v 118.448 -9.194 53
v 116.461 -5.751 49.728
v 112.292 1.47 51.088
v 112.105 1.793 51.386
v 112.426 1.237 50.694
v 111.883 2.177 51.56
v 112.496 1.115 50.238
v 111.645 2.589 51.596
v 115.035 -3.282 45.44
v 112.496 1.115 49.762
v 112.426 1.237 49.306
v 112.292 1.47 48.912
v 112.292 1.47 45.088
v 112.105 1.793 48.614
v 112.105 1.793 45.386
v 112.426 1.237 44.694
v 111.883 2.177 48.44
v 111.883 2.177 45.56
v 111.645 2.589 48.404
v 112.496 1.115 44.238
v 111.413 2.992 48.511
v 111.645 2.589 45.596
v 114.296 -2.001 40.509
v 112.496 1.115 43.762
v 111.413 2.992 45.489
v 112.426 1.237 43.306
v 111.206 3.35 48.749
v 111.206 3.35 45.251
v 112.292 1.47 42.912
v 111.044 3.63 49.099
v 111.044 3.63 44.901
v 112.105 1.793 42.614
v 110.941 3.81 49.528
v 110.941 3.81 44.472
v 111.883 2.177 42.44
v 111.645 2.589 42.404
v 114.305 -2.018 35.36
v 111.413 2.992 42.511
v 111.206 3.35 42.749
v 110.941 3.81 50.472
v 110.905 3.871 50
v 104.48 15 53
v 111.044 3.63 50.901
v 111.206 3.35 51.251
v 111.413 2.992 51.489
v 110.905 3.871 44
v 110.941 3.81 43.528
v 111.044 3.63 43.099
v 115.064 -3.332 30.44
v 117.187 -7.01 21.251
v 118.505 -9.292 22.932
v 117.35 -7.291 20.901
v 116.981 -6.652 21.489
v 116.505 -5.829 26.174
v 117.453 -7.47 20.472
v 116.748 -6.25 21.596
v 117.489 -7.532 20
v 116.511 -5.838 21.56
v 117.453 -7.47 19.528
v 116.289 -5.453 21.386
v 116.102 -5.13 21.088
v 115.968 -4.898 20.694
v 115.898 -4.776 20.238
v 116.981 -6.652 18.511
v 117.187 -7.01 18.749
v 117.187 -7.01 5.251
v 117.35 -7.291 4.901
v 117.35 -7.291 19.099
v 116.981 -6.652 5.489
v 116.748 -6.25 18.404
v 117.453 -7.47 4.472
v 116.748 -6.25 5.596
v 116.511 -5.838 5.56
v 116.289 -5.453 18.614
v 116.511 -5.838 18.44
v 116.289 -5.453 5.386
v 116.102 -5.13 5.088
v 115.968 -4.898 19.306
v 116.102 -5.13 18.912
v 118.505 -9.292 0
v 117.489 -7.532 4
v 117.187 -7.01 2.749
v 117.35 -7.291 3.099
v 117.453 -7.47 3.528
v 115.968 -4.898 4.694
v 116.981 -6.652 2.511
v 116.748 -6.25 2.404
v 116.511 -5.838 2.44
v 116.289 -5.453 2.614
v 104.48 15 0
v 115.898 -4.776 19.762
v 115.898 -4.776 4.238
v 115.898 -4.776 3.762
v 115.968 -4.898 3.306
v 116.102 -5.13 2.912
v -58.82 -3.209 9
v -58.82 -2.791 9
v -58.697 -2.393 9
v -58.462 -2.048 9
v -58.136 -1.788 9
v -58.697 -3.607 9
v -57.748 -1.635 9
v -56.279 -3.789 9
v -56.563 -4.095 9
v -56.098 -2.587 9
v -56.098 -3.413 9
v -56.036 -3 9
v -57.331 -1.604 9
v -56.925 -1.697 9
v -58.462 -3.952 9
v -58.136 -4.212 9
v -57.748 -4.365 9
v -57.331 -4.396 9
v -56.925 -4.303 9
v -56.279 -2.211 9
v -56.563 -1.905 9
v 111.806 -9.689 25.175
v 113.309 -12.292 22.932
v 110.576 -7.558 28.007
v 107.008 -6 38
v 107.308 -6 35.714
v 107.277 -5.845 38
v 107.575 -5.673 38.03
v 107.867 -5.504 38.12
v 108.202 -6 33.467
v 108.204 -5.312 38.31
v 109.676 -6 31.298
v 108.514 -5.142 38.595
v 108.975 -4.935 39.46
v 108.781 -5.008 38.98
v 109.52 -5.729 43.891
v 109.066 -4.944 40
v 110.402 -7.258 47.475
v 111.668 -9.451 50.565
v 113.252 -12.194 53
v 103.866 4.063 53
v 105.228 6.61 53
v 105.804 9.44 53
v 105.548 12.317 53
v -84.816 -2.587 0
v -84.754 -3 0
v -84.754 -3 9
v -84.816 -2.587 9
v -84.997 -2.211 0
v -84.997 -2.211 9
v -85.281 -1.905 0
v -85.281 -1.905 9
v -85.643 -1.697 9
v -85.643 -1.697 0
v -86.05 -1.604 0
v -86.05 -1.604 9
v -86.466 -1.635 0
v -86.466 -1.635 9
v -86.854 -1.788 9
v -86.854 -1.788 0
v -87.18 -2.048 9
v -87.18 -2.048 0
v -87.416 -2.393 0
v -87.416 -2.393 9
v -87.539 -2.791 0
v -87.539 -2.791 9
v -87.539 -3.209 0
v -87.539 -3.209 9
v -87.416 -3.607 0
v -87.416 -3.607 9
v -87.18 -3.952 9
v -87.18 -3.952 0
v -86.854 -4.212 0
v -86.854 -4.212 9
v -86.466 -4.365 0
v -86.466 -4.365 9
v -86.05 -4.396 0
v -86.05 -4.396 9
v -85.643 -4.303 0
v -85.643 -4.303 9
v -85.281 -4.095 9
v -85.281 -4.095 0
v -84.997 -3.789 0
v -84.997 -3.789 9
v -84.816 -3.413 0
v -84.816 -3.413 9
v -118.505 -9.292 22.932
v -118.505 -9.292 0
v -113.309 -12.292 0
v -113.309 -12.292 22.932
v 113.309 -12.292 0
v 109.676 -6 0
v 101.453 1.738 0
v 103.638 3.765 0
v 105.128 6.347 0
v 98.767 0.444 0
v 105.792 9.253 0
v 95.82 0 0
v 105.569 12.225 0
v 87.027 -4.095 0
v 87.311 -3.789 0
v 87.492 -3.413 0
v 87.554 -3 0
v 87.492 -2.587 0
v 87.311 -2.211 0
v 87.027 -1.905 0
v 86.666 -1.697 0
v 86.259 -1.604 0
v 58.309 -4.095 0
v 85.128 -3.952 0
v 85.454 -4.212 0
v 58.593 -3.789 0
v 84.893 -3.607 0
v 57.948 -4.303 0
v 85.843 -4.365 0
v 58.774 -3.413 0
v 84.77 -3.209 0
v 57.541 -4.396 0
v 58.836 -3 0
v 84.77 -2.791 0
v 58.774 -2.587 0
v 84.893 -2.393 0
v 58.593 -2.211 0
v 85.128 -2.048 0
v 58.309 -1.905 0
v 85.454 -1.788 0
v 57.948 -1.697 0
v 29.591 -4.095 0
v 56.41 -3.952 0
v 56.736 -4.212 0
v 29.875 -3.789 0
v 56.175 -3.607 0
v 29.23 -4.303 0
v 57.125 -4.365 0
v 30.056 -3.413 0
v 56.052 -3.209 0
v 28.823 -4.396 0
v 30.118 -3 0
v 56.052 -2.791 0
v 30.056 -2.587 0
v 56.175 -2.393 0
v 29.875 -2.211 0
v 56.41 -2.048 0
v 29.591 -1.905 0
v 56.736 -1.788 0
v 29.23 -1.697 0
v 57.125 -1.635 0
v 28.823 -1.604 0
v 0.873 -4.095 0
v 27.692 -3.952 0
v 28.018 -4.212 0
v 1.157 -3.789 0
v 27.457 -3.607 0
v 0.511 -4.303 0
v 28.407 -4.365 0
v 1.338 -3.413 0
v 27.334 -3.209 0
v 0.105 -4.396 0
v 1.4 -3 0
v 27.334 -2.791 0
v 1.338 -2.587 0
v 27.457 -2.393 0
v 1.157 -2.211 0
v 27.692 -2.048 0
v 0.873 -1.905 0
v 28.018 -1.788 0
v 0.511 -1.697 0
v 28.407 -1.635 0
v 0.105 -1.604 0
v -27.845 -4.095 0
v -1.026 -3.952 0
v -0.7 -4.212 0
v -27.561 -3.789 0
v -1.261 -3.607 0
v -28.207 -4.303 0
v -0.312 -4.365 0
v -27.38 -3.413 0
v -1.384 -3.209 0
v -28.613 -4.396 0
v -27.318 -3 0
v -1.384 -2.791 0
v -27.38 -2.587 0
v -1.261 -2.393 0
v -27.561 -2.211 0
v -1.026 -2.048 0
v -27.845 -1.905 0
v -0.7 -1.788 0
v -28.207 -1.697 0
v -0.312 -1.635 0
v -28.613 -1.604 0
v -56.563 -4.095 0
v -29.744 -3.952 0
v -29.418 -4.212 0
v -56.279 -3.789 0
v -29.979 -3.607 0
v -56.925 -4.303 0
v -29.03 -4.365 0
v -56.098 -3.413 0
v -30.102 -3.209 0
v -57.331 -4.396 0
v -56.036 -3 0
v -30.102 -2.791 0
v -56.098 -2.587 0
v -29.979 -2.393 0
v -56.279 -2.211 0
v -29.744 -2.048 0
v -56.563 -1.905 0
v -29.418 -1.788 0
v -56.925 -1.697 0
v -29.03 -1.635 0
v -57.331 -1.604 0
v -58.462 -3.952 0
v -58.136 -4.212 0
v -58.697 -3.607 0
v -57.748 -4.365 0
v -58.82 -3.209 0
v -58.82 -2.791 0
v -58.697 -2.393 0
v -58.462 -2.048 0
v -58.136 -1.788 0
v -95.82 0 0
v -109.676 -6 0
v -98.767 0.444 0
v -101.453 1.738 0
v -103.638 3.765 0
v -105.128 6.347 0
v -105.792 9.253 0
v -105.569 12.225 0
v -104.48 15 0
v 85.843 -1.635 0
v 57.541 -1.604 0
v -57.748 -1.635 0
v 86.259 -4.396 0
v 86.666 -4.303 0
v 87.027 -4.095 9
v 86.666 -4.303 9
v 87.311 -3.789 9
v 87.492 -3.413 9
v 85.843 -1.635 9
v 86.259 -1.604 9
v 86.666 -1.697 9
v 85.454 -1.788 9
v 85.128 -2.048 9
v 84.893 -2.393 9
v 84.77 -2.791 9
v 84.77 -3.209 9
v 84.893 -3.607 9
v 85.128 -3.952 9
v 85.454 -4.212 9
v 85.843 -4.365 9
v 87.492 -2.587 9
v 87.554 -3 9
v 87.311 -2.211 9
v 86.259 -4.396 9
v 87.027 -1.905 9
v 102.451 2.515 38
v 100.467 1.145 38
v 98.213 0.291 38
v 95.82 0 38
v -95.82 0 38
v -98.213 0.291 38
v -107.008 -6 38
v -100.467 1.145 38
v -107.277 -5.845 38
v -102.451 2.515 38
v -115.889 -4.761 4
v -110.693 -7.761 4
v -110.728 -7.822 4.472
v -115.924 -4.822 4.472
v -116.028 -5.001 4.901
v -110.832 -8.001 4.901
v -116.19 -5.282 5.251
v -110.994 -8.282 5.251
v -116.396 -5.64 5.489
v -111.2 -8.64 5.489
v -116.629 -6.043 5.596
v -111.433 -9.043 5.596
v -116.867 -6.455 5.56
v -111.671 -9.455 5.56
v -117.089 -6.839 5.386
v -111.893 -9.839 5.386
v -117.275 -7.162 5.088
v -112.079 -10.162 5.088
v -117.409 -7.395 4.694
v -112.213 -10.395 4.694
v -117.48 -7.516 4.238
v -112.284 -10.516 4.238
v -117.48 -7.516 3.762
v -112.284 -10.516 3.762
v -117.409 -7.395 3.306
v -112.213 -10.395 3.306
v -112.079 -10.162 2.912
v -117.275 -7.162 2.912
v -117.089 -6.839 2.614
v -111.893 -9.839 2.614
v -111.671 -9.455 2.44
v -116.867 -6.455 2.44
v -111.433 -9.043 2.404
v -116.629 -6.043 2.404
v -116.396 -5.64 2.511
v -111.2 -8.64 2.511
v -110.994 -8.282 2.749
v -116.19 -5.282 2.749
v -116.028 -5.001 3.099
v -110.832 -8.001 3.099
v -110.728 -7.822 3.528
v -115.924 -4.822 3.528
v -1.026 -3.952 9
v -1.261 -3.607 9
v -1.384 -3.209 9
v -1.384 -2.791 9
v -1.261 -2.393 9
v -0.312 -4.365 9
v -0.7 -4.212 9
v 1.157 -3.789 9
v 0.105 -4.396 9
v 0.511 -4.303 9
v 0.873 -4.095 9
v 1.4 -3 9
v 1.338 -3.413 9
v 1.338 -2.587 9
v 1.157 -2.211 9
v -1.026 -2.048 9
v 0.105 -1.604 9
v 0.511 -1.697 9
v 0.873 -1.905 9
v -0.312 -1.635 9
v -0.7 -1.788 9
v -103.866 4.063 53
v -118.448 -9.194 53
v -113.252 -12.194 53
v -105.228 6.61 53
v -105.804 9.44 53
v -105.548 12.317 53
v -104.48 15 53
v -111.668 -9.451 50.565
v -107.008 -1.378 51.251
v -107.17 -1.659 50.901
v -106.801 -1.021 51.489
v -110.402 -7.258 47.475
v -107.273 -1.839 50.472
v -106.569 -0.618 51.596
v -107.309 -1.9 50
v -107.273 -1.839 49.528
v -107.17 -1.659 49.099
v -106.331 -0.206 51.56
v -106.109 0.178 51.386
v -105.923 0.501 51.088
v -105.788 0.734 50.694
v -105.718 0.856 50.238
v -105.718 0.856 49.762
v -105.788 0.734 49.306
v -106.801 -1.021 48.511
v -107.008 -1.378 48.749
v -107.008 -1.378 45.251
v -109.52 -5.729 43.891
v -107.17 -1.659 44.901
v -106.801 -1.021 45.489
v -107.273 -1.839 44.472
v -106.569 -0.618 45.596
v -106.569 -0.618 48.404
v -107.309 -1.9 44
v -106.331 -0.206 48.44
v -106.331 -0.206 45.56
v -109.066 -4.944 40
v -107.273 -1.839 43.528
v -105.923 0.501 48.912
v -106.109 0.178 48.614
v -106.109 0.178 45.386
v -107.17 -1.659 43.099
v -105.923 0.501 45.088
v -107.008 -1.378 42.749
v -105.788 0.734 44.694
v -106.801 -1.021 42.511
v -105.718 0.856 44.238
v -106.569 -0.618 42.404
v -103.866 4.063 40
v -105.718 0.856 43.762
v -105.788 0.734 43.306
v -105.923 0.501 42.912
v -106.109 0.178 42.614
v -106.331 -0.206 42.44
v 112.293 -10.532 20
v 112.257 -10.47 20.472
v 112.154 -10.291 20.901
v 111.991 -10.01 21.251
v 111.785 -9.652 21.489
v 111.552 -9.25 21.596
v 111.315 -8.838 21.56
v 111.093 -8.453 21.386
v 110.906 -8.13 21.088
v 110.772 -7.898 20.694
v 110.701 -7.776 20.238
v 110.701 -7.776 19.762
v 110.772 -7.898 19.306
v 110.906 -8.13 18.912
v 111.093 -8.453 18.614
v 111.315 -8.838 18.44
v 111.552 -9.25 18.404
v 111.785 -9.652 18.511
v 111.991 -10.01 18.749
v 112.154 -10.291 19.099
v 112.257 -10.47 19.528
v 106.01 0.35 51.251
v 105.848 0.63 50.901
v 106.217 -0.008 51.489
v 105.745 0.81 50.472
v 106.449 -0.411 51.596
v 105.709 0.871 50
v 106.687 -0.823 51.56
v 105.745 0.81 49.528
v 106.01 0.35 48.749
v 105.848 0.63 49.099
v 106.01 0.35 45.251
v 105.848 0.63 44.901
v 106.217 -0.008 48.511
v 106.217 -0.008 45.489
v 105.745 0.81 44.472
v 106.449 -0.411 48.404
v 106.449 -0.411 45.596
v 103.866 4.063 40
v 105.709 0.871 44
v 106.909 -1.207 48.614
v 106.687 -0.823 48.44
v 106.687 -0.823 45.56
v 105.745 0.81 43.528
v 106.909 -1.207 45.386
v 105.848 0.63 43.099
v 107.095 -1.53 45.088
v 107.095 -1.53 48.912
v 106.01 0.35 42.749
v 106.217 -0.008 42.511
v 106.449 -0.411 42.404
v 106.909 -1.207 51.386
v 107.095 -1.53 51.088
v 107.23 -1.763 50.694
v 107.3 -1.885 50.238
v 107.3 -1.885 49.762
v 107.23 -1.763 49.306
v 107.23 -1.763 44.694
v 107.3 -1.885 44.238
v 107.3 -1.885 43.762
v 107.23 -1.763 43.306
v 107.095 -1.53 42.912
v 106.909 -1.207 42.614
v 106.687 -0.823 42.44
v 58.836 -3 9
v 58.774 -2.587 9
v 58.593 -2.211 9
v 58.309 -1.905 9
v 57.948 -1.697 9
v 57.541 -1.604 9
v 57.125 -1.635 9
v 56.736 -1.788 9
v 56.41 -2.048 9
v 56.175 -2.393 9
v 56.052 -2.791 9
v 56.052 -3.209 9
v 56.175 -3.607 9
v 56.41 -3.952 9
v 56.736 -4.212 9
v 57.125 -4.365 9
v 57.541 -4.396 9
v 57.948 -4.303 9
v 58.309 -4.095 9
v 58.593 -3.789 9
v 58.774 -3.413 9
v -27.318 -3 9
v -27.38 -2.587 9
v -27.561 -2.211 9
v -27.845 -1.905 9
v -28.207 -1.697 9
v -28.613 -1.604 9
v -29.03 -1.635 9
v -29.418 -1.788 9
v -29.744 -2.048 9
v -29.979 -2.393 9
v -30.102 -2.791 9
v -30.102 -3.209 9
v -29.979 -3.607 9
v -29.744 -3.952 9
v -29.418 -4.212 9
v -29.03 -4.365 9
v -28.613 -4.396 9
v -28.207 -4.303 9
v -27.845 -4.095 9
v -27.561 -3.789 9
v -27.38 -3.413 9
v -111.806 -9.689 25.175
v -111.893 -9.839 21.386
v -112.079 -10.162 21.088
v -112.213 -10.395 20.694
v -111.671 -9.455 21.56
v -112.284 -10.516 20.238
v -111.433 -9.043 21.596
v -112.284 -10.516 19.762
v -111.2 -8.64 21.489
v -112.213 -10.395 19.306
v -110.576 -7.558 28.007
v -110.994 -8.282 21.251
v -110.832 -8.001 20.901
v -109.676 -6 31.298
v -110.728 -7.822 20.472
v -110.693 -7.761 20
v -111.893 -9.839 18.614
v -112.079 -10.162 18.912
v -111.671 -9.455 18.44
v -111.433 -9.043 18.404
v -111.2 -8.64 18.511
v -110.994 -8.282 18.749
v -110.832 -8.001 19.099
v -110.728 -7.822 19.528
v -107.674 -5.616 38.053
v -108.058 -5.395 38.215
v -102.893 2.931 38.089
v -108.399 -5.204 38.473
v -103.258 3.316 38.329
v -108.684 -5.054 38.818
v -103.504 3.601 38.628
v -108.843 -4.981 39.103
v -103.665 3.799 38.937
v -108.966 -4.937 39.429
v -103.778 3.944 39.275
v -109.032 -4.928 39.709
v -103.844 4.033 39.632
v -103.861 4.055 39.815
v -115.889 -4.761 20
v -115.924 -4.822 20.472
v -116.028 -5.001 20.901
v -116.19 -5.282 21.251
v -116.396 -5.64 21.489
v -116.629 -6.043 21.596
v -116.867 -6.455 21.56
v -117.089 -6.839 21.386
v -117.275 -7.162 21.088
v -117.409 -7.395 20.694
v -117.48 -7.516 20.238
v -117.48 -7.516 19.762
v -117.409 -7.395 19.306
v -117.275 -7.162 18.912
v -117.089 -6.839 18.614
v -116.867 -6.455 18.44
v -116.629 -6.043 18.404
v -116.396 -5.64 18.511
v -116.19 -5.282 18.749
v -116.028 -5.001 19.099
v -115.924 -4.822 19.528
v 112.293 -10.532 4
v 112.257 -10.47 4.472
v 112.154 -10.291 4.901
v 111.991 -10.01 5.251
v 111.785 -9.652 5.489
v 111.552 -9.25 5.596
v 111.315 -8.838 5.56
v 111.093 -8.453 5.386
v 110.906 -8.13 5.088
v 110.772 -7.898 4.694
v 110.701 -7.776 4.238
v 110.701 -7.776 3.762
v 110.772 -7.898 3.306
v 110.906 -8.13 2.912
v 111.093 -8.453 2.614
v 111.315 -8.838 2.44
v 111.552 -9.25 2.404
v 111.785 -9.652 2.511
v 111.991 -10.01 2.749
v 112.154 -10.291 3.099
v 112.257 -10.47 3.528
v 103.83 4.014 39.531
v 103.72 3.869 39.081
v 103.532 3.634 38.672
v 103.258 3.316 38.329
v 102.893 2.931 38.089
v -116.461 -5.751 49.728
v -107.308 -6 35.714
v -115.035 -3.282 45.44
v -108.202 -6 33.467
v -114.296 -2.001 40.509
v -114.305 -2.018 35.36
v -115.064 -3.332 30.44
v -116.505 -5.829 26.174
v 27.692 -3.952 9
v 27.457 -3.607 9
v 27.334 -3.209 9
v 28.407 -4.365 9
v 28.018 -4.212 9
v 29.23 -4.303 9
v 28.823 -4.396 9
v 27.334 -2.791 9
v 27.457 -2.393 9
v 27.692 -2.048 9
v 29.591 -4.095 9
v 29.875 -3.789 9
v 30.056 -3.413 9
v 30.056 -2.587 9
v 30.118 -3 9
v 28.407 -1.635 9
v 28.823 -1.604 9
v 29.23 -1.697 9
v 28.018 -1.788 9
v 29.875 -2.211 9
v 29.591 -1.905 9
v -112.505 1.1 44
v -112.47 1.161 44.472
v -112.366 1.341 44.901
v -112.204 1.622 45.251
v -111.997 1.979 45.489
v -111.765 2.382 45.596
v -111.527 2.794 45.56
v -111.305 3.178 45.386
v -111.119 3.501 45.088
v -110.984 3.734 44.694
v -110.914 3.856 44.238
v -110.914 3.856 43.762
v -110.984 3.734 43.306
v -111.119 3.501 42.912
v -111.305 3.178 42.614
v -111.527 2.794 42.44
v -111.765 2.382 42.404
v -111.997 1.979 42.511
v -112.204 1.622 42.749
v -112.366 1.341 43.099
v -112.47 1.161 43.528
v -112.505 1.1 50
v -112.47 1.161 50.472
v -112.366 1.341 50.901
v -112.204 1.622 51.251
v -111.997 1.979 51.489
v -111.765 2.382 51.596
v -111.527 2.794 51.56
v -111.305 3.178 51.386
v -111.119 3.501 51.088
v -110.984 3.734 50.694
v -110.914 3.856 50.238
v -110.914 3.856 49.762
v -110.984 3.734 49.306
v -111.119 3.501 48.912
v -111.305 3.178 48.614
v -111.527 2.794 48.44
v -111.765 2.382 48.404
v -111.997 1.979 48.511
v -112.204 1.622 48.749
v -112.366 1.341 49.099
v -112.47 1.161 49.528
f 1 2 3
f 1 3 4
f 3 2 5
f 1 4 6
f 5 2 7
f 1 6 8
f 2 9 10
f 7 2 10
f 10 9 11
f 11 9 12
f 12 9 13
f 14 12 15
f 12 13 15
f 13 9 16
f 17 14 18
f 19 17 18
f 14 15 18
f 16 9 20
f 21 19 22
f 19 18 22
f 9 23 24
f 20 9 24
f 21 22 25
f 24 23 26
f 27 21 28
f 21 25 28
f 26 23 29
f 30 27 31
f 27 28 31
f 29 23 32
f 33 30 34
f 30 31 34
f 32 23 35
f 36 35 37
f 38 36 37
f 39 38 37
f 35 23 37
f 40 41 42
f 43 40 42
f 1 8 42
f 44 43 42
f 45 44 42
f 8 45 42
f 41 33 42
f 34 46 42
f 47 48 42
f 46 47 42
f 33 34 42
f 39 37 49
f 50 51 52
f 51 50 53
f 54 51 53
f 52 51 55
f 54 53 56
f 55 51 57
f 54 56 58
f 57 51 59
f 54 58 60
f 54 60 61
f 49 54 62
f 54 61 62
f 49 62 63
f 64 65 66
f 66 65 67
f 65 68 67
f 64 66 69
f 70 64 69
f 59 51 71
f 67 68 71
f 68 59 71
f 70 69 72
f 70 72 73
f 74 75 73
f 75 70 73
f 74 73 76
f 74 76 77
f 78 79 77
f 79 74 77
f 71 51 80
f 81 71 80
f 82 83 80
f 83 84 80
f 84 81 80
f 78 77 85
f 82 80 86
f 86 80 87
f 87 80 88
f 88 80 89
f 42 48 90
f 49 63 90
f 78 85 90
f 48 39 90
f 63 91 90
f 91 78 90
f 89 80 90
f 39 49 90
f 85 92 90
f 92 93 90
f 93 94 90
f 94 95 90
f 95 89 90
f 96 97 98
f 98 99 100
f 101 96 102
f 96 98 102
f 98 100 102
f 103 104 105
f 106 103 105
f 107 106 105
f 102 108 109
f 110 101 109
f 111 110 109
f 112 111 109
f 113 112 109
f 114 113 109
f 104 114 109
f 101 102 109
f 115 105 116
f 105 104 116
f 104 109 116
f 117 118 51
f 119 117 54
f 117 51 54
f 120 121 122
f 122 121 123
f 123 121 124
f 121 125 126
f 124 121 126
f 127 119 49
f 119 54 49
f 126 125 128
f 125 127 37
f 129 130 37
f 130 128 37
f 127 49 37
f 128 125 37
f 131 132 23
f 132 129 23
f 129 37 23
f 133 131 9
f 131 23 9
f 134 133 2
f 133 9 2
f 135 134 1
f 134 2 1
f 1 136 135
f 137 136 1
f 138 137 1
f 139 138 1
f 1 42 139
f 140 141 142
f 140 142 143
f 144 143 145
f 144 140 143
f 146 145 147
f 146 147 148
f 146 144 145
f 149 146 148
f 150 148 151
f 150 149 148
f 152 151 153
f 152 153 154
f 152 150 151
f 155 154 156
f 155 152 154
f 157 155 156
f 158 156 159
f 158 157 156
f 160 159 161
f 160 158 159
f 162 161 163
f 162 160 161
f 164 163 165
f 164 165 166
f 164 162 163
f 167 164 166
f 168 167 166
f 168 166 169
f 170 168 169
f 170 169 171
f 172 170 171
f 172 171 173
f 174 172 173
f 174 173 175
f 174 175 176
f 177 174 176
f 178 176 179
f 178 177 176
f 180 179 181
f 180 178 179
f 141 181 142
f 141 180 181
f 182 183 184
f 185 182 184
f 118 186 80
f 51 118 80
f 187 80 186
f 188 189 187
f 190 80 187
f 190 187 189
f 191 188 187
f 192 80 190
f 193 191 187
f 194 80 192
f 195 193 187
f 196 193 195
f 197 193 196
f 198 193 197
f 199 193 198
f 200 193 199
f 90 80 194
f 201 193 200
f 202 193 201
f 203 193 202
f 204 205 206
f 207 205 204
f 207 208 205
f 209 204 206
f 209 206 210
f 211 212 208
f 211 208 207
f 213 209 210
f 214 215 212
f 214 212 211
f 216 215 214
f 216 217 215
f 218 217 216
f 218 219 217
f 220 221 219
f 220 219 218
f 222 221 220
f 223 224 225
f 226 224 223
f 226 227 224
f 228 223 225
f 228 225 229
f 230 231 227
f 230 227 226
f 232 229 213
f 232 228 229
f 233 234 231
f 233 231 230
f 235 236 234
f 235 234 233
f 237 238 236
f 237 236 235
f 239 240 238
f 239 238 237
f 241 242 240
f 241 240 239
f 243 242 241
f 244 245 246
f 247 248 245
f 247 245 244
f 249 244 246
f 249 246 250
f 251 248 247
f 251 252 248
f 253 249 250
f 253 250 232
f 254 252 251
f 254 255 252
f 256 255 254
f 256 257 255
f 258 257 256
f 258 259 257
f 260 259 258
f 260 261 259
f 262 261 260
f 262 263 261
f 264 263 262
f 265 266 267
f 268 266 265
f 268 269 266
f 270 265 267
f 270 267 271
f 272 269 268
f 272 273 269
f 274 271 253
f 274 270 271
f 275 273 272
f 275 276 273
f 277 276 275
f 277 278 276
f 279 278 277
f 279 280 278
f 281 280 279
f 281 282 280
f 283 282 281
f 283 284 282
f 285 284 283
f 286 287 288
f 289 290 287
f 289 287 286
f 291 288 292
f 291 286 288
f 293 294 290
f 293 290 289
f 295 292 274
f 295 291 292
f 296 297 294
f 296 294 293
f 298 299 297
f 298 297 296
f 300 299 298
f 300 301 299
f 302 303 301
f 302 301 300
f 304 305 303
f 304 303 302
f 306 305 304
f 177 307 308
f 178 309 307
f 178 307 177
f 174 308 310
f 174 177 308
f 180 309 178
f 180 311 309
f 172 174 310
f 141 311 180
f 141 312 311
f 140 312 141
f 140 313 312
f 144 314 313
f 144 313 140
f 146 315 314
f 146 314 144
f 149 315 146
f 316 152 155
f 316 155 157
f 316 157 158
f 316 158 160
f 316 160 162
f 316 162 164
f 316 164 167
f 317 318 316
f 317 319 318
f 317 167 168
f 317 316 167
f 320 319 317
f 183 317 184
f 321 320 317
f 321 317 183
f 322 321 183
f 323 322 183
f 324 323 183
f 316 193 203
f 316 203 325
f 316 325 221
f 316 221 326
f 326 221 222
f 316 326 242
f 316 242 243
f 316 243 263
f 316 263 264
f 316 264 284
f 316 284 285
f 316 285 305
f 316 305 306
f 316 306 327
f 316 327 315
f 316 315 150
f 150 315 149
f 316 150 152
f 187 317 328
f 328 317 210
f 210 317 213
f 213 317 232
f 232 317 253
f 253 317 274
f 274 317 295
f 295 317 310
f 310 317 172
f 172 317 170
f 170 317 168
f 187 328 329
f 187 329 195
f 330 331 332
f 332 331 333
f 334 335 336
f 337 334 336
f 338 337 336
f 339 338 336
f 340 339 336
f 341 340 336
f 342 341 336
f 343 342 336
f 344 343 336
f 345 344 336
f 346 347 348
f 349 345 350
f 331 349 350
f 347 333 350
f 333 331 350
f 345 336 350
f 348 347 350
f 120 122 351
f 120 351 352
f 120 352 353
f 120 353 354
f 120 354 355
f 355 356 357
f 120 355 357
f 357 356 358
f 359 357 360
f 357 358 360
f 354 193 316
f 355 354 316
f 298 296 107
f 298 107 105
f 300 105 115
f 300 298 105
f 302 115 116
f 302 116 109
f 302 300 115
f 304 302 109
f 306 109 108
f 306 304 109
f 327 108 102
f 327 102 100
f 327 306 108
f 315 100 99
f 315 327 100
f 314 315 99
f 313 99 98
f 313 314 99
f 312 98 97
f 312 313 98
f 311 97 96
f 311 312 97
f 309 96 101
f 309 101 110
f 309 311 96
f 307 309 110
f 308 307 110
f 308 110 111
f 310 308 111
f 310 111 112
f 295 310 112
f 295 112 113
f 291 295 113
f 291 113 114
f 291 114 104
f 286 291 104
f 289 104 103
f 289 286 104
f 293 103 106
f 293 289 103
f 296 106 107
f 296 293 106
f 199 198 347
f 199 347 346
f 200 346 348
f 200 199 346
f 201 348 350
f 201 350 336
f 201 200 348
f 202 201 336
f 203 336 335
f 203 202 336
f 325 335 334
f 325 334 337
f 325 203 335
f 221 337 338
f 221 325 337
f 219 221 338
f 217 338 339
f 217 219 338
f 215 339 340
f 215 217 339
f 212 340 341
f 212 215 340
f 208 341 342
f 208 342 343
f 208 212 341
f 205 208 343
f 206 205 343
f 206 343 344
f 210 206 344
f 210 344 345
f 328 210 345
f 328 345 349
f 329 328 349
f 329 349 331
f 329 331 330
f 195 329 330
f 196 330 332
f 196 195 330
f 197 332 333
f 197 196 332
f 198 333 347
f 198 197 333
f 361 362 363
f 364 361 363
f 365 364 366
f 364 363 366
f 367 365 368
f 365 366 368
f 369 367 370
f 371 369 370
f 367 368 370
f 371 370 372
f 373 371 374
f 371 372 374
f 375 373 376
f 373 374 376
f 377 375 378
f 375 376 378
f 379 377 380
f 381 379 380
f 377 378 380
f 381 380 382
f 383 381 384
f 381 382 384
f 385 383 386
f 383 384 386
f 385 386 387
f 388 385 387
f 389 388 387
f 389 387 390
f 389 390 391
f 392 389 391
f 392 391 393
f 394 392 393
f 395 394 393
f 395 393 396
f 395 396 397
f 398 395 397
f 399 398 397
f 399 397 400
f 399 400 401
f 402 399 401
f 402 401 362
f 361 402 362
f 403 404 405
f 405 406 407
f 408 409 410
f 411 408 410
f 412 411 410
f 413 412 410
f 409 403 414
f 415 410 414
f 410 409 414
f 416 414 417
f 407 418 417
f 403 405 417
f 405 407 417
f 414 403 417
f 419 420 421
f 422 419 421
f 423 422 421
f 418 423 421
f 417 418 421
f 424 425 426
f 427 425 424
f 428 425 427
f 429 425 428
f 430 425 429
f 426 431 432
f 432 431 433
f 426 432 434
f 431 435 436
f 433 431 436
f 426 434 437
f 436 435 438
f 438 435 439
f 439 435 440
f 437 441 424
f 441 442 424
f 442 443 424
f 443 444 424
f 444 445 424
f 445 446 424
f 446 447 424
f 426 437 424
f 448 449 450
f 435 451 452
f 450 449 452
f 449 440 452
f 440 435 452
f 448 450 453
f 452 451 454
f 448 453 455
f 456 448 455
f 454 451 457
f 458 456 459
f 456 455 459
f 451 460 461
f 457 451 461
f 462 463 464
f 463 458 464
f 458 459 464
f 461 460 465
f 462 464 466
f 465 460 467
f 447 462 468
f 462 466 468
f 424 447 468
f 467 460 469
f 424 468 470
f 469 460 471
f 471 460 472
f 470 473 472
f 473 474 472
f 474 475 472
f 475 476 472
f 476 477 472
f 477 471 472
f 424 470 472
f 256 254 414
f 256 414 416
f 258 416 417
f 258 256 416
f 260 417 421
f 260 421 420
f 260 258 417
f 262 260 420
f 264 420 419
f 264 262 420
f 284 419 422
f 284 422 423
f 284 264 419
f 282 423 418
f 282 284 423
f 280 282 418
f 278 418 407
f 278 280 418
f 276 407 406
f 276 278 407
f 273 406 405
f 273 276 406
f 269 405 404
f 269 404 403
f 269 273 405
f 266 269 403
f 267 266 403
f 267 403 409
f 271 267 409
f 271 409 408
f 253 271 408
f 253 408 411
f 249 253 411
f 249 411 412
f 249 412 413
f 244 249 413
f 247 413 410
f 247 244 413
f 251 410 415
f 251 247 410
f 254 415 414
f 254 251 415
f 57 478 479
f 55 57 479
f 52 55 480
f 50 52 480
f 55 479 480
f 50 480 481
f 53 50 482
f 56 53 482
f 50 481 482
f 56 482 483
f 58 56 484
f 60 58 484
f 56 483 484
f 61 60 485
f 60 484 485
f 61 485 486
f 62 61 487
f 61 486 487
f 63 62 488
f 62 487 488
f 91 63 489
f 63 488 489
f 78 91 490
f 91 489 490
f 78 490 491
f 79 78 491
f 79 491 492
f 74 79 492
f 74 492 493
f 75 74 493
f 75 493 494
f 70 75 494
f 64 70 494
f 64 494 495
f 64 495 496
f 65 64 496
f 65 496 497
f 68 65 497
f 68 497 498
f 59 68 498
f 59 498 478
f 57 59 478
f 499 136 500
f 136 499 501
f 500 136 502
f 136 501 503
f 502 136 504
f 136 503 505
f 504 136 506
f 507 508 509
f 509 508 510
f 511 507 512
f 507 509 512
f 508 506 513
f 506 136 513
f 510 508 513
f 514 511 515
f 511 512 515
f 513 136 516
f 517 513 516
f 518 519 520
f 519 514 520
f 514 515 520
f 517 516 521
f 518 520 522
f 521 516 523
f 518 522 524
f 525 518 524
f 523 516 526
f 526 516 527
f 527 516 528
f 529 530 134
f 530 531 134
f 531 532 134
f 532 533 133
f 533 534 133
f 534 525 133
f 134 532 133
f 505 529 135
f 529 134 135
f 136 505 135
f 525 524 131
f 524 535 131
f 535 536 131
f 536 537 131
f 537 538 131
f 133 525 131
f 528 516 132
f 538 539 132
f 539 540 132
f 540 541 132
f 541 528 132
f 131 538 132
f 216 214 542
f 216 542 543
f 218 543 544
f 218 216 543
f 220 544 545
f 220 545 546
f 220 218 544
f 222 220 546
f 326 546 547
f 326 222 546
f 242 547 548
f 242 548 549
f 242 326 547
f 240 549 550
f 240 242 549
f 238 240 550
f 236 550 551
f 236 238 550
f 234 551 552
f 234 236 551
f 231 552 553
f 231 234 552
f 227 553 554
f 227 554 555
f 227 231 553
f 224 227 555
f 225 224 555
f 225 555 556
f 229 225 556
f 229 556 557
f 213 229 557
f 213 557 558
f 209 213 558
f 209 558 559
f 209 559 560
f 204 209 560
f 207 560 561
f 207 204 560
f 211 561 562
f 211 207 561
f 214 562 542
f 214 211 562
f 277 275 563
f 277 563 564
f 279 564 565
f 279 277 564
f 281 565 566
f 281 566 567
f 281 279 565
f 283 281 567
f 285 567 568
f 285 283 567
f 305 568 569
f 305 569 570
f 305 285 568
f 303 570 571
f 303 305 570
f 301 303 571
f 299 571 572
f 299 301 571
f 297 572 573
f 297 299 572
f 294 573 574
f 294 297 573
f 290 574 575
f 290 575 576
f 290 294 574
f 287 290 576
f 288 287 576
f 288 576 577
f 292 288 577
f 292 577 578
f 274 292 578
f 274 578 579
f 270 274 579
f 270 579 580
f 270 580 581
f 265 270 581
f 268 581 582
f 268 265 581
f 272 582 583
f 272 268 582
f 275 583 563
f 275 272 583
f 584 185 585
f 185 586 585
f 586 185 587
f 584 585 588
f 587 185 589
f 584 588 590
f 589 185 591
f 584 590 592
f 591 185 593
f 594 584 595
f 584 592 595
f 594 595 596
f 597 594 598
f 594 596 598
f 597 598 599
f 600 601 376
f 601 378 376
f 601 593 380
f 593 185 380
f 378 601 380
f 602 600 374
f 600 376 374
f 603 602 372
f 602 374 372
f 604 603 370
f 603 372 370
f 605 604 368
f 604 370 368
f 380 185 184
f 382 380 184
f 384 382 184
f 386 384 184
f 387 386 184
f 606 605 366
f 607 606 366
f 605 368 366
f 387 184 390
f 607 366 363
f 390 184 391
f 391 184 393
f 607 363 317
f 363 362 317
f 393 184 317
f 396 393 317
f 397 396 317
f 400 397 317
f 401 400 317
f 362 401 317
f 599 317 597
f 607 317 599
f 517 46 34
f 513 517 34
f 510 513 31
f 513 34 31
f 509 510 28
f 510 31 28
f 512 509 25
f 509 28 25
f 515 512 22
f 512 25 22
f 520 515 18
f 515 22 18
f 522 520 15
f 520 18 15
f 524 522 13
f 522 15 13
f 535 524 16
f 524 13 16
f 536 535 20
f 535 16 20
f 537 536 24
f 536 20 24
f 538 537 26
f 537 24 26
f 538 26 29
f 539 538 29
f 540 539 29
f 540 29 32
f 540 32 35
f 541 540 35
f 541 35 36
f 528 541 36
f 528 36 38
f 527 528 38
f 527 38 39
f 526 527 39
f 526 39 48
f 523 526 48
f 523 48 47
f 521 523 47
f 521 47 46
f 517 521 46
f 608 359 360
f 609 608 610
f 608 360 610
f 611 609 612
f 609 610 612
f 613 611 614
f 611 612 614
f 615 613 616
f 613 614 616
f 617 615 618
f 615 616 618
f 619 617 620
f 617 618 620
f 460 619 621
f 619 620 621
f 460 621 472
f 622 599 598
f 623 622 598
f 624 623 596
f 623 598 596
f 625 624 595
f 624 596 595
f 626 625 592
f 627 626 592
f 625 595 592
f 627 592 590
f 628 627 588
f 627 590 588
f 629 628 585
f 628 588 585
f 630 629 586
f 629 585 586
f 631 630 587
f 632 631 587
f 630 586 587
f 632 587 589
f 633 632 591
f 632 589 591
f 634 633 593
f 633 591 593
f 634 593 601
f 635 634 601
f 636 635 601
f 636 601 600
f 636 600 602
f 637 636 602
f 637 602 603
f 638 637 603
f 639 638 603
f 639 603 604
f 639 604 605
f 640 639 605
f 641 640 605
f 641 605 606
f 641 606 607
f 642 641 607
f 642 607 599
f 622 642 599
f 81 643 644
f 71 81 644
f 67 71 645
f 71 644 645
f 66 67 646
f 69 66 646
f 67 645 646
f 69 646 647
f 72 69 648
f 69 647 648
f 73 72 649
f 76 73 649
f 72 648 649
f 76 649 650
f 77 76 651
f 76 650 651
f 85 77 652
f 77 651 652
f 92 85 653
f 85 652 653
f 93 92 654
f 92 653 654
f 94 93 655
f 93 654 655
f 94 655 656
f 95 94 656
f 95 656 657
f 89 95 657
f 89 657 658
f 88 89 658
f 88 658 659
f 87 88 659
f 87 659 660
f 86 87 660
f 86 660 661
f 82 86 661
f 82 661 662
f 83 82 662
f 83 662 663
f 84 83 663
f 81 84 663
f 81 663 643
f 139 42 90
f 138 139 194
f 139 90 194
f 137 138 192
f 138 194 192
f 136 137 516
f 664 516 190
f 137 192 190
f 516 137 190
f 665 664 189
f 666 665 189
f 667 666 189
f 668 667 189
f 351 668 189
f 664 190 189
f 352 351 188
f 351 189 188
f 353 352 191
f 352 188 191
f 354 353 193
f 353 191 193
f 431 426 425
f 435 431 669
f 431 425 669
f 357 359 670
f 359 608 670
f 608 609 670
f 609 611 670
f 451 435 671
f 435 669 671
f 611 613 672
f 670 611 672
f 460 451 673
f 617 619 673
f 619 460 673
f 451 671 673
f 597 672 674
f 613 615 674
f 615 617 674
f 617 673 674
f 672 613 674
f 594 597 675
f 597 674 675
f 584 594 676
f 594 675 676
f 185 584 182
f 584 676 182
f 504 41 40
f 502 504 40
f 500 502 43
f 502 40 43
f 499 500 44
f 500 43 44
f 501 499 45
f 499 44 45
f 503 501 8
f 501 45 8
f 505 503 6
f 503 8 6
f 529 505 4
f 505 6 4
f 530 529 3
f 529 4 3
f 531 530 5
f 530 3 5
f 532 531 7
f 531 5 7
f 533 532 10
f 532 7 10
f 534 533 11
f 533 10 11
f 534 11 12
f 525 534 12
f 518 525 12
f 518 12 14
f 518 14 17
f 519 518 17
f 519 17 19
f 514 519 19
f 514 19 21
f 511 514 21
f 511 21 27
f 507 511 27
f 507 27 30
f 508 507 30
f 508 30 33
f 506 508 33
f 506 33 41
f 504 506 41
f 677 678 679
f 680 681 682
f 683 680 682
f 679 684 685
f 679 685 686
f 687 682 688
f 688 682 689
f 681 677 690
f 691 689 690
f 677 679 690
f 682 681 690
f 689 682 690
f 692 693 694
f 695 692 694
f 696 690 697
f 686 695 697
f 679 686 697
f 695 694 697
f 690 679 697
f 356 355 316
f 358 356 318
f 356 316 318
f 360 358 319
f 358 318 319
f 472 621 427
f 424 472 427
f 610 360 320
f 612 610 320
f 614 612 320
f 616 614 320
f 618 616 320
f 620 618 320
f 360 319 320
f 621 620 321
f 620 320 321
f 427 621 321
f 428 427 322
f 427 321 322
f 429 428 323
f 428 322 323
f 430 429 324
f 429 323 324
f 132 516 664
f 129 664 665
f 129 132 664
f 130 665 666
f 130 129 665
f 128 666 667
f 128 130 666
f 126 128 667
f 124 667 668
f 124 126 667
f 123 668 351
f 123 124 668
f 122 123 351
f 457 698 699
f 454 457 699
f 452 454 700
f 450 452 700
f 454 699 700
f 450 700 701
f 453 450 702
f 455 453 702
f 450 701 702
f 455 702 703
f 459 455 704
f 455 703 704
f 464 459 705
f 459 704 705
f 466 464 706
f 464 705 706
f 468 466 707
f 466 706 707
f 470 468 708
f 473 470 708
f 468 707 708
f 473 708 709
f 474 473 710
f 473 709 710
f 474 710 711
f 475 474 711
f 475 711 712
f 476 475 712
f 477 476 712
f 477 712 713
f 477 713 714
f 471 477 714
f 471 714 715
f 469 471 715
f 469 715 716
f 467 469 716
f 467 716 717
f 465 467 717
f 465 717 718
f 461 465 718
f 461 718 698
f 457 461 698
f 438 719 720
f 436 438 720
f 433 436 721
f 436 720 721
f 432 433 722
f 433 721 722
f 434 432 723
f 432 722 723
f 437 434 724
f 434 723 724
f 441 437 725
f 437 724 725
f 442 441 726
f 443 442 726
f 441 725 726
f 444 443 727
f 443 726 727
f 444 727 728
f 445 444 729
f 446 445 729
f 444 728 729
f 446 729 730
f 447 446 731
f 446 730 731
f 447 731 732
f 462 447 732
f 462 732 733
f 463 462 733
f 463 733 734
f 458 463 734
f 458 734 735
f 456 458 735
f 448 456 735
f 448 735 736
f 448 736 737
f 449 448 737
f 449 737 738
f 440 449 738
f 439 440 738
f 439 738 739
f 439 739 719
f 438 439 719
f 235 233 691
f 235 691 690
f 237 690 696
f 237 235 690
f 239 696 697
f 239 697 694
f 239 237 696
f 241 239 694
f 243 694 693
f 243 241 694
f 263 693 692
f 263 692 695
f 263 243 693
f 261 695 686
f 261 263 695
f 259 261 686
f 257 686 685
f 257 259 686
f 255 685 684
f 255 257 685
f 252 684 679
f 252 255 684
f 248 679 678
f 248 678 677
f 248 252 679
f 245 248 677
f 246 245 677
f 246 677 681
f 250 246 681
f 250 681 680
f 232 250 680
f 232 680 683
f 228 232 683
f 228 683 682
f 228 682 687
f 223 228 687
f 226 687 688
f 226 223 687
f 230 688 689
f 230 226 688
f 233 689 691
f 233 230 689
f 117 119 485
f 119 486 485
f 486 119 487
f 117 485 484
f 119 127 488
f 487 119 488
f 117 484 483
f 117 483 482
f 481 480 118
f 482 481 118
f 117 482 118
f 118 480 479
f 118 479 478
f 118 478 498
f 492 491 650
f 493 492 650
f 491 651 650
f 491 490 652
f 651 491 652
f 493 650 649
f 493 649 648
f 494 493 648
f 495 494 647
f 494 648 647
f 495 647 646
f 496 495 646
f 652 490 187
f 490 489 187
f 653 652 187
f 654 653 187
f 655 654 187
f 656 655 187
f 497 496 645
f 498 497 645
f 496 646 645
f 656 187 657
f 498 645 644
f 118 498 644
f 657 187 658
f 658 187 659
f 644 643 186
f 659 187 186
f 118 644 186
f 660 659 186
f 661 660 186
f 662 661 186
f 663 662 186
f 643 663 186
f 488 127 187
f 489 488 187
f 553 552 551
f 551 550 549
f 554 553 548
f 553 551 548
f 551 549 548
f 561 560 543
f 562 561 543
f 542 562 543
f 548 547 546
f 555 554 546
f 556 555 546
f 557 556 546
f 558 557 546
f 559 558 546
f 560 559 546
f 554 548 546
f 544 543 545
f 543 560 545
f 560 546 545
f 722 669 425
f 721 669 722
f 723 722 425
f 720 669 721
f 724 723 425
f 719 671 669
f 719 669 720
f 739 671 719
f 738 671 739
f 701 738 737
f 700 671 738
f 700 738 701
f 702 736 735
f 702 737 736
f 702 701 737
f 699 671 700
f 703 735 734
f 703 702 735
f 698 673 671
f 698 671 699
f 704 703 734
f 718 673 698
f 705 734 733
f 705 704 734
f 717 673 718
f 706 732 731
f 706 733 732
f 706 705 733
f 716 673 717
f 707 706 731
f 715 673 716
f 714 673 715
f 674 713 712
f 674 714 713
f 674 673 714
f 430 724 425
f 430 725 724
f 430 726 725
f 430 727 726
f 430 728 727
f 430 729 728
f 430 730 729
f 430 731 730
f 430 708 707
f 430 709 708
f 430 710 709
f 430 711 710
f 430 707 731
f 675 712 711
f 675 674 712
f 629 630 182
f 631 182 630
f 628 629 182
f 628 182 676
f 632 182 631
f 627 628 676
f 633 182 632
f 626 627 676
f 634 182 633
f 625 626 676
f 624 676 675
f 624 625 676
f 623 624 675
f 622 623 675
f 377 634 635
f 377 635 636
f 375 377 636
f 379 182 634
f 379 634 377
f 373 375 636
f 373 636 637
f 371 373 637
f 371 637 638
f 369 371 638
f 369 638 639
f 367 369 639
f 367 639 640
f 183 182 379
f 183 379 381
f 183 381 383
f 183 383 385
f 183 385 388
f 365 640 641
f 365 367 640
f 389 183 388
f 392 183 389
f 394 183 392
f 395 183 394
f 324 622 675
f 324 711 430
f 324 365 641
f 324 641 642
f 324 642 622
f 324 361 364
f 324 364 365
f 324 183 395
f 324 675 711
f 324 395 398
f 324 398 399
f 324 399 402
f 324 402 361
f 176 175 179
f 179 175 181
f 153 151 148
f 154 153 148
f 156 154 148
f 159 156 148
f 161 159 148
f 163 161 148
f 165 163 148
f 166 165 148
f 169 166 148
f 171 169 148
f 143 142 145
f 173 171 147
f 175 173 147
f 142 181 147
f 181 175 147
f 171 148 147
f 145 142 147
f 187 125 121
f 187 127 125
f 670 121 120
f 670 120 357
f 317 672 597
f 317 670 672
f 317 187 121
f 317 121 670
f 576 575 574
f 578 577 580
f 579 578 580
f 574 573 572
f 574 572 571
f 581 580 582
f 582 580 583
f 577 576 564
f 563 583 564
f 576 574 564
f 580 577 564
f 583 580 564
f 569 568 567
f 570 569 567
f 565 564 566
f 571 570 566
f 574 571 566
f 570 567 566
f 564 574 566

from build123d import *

# Parameters (mm, degrees)
BOSS_EXTRUDE1_DEPTH = 2
BOSS_EXTRUDE2_DEPTH = 38
MANUAL_FILLET_DEPTH = 38
SKETCH7_R           = 1.399999999999996
SKETCH7_R_2         = 1.4
SKETCH7_R_3         = 1.3999999999999992
SKETCH7_R_4         = 1.4000000000000026
BOTTOM_SCREWS_DEPTH = 9
LEFT_SCREWS_REACH   = 212.024
SKETCH8_R           = 1.6000000000000127
SKETCH8_R_2         = 1.600000000000008
RIGHT_SCREWS_REACH  = 212.024
SKETCH9_R           = 1.6000000000000127
SKETCH9_R_2         = 1.600000000000007
BOSS_EXTRUDE3_DEPTH = 15
CUT_EXTRUDE1_REACH  = 220.907
SKETCH10_R          = 17.50000000000029
SKETCH10_R_2        = 1.6000000000000194
SKETCH10_R_3        = 1.5999999999999908
CUT_EXTRUDE2_REACH  = 220.907
SKETCH11_R          = 17.500000000000004
SKETCH11_R_2        = 1.600000000000006
SKETCH11_R_3        = 1.5999999999999974
FILLET1_R           = 2


with BuildPart() as part:
    # Sketch2 → Boss-Extrude1 (new body)
    with BuildSketch(Plane.XY):
        Polygon((-113.14018169510446, 0), (113.14018169510446, 2.771e-14), (118.50513169510454, -9.292365980066561), (113.30897927239795, -12.292365980066618), (109.67608007996674, -5.999999999999973), (-109.67608007996674, -6), (-113.30897927239795, -12.292365980066647), (-118.50513169510454, -9.292365980066593), align=None)
    extrude(amount=BOSS_EXTRUDE1_DEPTH)

    # Sketch2<3> → Boss-Extrude2 (add)
    with BuildSketch(Plane.XY):
        Polygon((-113.14018169510446, 0), (113.14018169510446, 2.771e-14), (118.50513169510454, -9.292365980066561), (113.30897927239795, -12.292365980066618), (109.67608007996674, -5.999999999999973), (-109.67608007996674, -6), (-113.30897927239795, -12.292365980066647), (-118.50513169510454, -9.292365980066593), align=None)
    extrude(amount=BOSS_EXTRUDE2_DEPTH)

    # Sketch6 → Manual fillet (add)
    with BuildSketch(Plane(origin=(0, 0, 0), x_dir=(-1, 0, 0), z_dir=(0, 0, -1))):
        with BuildLine():
            Line((-114.87223250267334, -2.99999999999992), (-104.47992765725986, 15.00000000000004))
            ThreePointArc((-104.47992765725986, 15.00000000000004), (-104.47992765725994, 5.00000000000003), (-95.81967361941555, -2.602e-14))
            Line((-95.81967361941555, -2.602e-14), (95.81967361941547, -1.73e-15))
            ThreePointArc((95.81967361941547, -1.73e-15), (104.47992765725988, 5.00000000000004), (104.47992765725981, 15.000000000000083))
            Line((104.47992765725981, 15.000000000000083), (114.87223250267334, -2.999999999999949))
            Line((114.87223250267334, -2.999999999999949), (109.67608007996674, -6))
            Line((109.67608007996674, -6), (-109.67608007996674, -5.999999999999973))
            Line((-109.67608007996674, -5.999999999999973), (-114.87223250267334, -2.99999999999992))
        make_face()
    extrude(amount=-MANUAL_FILLET_DEPTH)

    # Sketch7 → Bottom screws (cut)
    with BuildSketch(Plane.XY):
        with Locations((57.436116251336735, -3.0000000000000004)):
            Circle(SKETCH7_R)
        with Locations((-1.25e-15, -3.0000000000000004)):
            Circle(SKETCH7_R_2)
        with Locations((-57.436116251336564, -3.0000000000000004)):
            Circle(SKETCH7_R)
        with Locations((-28.718058125668286, -3.000000000000001)):
            Circle(SKETCH7_R_3)
        with Locations((28.718058125668367, -3.000000000000001)):
            Circle(SKETCH7_R_3)
        with Locations((-86.15417437700485, -3.000000000000001)):
            Circle(SKETCH7_R_4)
        with Locations((86.15417437700509, -3.000000000000001)):
            Circle(SKETCH7_R_4)
    extrude(amount=BOTTOM_SCREWS_DEPTH, mode=Mode.SUBTRACT)

    # Sketch8 → Left screws (cut, up to next)
    with BuildSketch(Plane(origin=(-79.65898384862079, 45.991135768374306, 0), x_dir=(0, 0, -1), z_dir=(0.8660254037844329, -0.5000000000000101, 0)), mode=Mode.PRIVATE) as left_screws_sk1:
        with Locations(Location((-20, -63.66709165512205, 0), (0, 0, 90))):
            Circle(SKETCH8_R)
    left_screws_tool1 = extrude(left_screws_sk1.sketch, amount=-LEFT_SCREWS_REACH, mode=Mode.PRIVATE) & part.part
    # Sketch8 → Left screws (cut, up to next)
    with BuildSketch(Plane(origin=(-79.65898384862079, 45.991135768374306, 0), x_dir=(0, 0, -1), z_dir=(0.8660254037844329, -0.5000000000000101, 0)), mode=Mode.PRIVATE) as left_screws_sk2:
        with Locations(Location((-4, -63.66709165512205, 0), (0, 0, 90))):
            Circle(SKETCH8_R_2)
    left_screws_tool2 = extrude(left_screws_sk2.sketch, amount=-LEFT_SCREWS_REACH, mode=Mode.PRIVATE) & part.part
    add(left_screws_tool1.solids().sort_by_distance((-111.49253, -9.146183, 20))[0], mode=Mode.SUBTRACT)
    add(left_screws_tool2.solids().sort_by_distance((-111.49253, -9.146183, 4))[0], mode=Mode.SUBTRACT)

    # Sketch9 → Right screws (cut, up to next)
    with BuildSketch(Plane(origin=(79.6589838486208, 45.99113576837435, 0), x_dir=(0, 0, 1), z_dir=(-0.8660254037844329, -0.5000000000000101, 0)), mode=Mode.PRIVATE) as right_screws_sk1:
        with Locations(Location((20, -63.66709165512205, 0), (0, 0, 270))):
            Circle(SKETCH9_R)
    right_screws_tool1 = extrude(right_screws_sk1.sketch, amount=-RIGHT_SCREWS_REACH, mode=Mode.PRIVATE) & part.part
    # Sketch9 → Right screws (cut, up to next)
    with BuildSketch(Plane(origin=(79.6589838486208, 45.99113576837435, 0), x_dir=(0, 0, 1), z_dir=(-0.8660254037844329, -0.5000000000000101, 0)), mode=Mode.PRIVATE) as right_screws_sk2:
        with Locations(Location((4, -63.66709165512205, 0), (0, 0, 270))):
            Circle(SKETCH9_R_2)
    right_screws_tool2 = extrude(right_screws_sk2.sketch, amount=-RIGHT_SCREWS_REACH, mode=Mode.PRIVATE) & part.part
    add(right_screws_tool1.solids().sort_by_distance((111.49253, -9.146183, 20))[0], mode=Mode.SUBTRACT)
    add(right_screws_tool2.solids().sort_by_distance((111.49253, -9.146183, 4))[0], mode=Mode.SUBTRACT)

    # Sketch12 → Boss-Extrude3 (add)
    with BuildSketch(Plane.XY.offset(38.000000000000064)):
        with BuildLine():
            Line((103.86635092950917, 4.062746066806283), (113.30897927239795, -12.292365980066622))
            Line((113.30897927239795, -12.292365980066622), (118.50513169510454, -9.292365980066565))
            Line((118.50513169510454, -9.292365980066565), (104.47992765725988, 15.00000000000004))
            ThreePointArc((104.47992765725988, 15.00000000000004), (105.80397478003607, 9.439883642417866), (103.86635092950917, 4.062746066806283))
        make_face()
        with BuildLine():
            Line((-104.47992765725981, 15.000000000000082), (-118.50513169510454, -9.292365980066597))
            Line((-118.50513169510454, -9.292365980066597), (-113.30897927239795, -12.29236598006665))
            Line((-113.30897927239795, -12.29236598006665), (-103.86635092950914, 4.062746066806313))
            ThreePointArc((-103.86635092950914, 4.062746066806313), (-105.80397478003603, 9.439883642417914), (-104.47992765725981, 15.000000000000082))
        make_face()
    extrude(amount=BOSS_EXTRUDE3_DEPTH)

    # Sketch10 → Cut-Extrude1 (cut, up to next)
    with BuildSketch(Plane(origin=(84.85513627132735, 48.991135768374356, 0), x_dir=(0, 0, -1), z_dir=(0.8660254037844342, 0.500000000000008, 0)), mode=Mode.PRIVATE) as cut_extrude1_sk1:
        with Locations((-38.000000000000085, -76.19999084755334)):
            Circle(SKETCH10_R)
    cut_extrude1_tool1 = extrude(cut_extrude1_sk1.sketch, amount=-CUT_EXTRUDE1_REACH, mode=Mode.PRIVATE) & part.part
    # Sketch10 → Cut-Extrude1 (cut, up to next)
    with BuildSketch(Plane(origin=(84.85513627132735, 48.991135768374356, 0), x_dir=(0, 0, -1), z_dir=(0.8660254037844342, 0.500000000000008, 0)), mode=Mode.PRIVATE) as cut_extrude1_sk2:
        with Locations(Location((-43.99999999999998, -53.69999084755312, 0), (0, 0, 90))):
            Circle(SKETCH10_R_2)
    cut_extrude1_tool2 = extrude(cut_extrude1_sk2.sketch, amount=-CUT_EXTRUDE1_REACH, mode=Mode.PRIVATE) & part.part
    # Sketch10 → Cut-Extrude1 (cut, up to next)
    with BuildSketch(Plane(origin=(84.85513627132735, 48.991135768374356, 0), x_dir=(0, 0, -1), z_dir=(0.8660254037844342, 0.500000000000008, 0)), mode=Mode.PRIVATE) as cut_extrude1_sk3:
        with Locations(Location((-49.99999999999997, -53.69999084755311, 0), (0, 0, 90))):
            Circle(SKETCH10_R_3)
    cut_extrude1_tool3 = extrude(cut_extrude1_sk3.sketch, amount=-CUT_EXTRUDE1_REACH, mode=Mode.PRIVATE) & part.part
    add(cut_extrude1_tool1.solids().sort_by_distance((122.955132, -16.999992, 38))[0], mode=Mode.SUBTRACT)
    add(cut_extrude1_tool2.solids().sort_by_distance((111.705132, 2.48558, 44))[0], mode=Mode.SUBTRACT)
    add(cut_extrude1_tool3.solids().sort_by_distance((111.705132, 2.48558, 50))[0], mode=Mode.SUBTRACT)

    # Sketch11 → Cut-Extrude2 (cut, up to next)
    with BuildSketch(Plane(origin=(-84.85513627132738, 48.99113576837434, 0), x_dir=(0, 0, 1), z_dir=(-0.8660254037844335, 0.500000000000009, 0)), mode=Mode.PRIVATE) as cut_extrude2_sk1:
        with Locations((38.000000000000085, -76.19999084755318)):
            Circle(SKETCH11_R)
    cut_extrude2_tool1 = extrude(cut_extrude2_sk1.sketch, amount=-CUT_EXTRUDE2_REACH, mode=Mode.PRIVATE) & part.part
    # Sketch11 → Cut-Extrude2 (cut, up to next)
    with BuildSketch(Plane(origin=(-84.85513627132738, 48.99113576837434, 0), x_dir=(0, 0, 1), z_dir=(-0.8660254037844335, 0.500000000000009, 0)), mode=Mode.PRIVATE) as cut_extrude2_sk2:
        with Locations(Location((50.00000000000008, -53.699990847553025, 0), (0, 0, 270))):
            Circle(SKETCH11_R_2)
    cut_extrude2_tool2 = extrude(cut_extrude2_sk2.sketch, amount=-CUT_EXTRUDE2_REACH, mode=Mode.PRIVATE) & part.part
    # Sketch11 → Cut-Extrude2 (cut, up to next)
    with BuildSketch(Plane(origin=(-84.85513627132738, 48.99113576837434, 0), x_dir=(0, 0, 1), z_dir=(-0.8660254037844335, 0.500000000000009, 0)), mode=Mode.PRIVATE) as cut_extrude2_sk3:
        with Locations(Location((44.00000000000008, -53.699990847553025, 0), (0, 0, 270))):
            Circle(SKETCH11_R_3)
    cut_extrude2_tool3 = extrude(cut_extrude2_sk3.sketch, amount=-CUT_EXTRUDE2_REACH, mode=Mode.PRIVATE) & part.part
    add(cut_extrude2_tool1.solids().sort_by_distance((-122.955132, -16.999992, 38))[0], mode=Mode.SUBTRACT)
    add(cut_extrude2_tool2.solids().sort_by_distance((-111.705132, 2.48558, 50))[0], mode=Mode.SUBTRACT)
    add(cut_extrude2_tool3.solids().sort_by_distance((-111.705132, 2.48558, 44))[0], mode=Mode.SUBTRACT)

    # Fillet1
    fillet1_edges = [part.edges().sort_by_distance(p)[0] for p in [
        (106.4376651009535, -0.3909007203570517, 38.000000000000064),
        (-106.43766510095352, -0.3909007203571352, 38.000000000000064),
    ]]
    fillet(fillet1_edges, radius=FILLET1_R)


solid = part.part
